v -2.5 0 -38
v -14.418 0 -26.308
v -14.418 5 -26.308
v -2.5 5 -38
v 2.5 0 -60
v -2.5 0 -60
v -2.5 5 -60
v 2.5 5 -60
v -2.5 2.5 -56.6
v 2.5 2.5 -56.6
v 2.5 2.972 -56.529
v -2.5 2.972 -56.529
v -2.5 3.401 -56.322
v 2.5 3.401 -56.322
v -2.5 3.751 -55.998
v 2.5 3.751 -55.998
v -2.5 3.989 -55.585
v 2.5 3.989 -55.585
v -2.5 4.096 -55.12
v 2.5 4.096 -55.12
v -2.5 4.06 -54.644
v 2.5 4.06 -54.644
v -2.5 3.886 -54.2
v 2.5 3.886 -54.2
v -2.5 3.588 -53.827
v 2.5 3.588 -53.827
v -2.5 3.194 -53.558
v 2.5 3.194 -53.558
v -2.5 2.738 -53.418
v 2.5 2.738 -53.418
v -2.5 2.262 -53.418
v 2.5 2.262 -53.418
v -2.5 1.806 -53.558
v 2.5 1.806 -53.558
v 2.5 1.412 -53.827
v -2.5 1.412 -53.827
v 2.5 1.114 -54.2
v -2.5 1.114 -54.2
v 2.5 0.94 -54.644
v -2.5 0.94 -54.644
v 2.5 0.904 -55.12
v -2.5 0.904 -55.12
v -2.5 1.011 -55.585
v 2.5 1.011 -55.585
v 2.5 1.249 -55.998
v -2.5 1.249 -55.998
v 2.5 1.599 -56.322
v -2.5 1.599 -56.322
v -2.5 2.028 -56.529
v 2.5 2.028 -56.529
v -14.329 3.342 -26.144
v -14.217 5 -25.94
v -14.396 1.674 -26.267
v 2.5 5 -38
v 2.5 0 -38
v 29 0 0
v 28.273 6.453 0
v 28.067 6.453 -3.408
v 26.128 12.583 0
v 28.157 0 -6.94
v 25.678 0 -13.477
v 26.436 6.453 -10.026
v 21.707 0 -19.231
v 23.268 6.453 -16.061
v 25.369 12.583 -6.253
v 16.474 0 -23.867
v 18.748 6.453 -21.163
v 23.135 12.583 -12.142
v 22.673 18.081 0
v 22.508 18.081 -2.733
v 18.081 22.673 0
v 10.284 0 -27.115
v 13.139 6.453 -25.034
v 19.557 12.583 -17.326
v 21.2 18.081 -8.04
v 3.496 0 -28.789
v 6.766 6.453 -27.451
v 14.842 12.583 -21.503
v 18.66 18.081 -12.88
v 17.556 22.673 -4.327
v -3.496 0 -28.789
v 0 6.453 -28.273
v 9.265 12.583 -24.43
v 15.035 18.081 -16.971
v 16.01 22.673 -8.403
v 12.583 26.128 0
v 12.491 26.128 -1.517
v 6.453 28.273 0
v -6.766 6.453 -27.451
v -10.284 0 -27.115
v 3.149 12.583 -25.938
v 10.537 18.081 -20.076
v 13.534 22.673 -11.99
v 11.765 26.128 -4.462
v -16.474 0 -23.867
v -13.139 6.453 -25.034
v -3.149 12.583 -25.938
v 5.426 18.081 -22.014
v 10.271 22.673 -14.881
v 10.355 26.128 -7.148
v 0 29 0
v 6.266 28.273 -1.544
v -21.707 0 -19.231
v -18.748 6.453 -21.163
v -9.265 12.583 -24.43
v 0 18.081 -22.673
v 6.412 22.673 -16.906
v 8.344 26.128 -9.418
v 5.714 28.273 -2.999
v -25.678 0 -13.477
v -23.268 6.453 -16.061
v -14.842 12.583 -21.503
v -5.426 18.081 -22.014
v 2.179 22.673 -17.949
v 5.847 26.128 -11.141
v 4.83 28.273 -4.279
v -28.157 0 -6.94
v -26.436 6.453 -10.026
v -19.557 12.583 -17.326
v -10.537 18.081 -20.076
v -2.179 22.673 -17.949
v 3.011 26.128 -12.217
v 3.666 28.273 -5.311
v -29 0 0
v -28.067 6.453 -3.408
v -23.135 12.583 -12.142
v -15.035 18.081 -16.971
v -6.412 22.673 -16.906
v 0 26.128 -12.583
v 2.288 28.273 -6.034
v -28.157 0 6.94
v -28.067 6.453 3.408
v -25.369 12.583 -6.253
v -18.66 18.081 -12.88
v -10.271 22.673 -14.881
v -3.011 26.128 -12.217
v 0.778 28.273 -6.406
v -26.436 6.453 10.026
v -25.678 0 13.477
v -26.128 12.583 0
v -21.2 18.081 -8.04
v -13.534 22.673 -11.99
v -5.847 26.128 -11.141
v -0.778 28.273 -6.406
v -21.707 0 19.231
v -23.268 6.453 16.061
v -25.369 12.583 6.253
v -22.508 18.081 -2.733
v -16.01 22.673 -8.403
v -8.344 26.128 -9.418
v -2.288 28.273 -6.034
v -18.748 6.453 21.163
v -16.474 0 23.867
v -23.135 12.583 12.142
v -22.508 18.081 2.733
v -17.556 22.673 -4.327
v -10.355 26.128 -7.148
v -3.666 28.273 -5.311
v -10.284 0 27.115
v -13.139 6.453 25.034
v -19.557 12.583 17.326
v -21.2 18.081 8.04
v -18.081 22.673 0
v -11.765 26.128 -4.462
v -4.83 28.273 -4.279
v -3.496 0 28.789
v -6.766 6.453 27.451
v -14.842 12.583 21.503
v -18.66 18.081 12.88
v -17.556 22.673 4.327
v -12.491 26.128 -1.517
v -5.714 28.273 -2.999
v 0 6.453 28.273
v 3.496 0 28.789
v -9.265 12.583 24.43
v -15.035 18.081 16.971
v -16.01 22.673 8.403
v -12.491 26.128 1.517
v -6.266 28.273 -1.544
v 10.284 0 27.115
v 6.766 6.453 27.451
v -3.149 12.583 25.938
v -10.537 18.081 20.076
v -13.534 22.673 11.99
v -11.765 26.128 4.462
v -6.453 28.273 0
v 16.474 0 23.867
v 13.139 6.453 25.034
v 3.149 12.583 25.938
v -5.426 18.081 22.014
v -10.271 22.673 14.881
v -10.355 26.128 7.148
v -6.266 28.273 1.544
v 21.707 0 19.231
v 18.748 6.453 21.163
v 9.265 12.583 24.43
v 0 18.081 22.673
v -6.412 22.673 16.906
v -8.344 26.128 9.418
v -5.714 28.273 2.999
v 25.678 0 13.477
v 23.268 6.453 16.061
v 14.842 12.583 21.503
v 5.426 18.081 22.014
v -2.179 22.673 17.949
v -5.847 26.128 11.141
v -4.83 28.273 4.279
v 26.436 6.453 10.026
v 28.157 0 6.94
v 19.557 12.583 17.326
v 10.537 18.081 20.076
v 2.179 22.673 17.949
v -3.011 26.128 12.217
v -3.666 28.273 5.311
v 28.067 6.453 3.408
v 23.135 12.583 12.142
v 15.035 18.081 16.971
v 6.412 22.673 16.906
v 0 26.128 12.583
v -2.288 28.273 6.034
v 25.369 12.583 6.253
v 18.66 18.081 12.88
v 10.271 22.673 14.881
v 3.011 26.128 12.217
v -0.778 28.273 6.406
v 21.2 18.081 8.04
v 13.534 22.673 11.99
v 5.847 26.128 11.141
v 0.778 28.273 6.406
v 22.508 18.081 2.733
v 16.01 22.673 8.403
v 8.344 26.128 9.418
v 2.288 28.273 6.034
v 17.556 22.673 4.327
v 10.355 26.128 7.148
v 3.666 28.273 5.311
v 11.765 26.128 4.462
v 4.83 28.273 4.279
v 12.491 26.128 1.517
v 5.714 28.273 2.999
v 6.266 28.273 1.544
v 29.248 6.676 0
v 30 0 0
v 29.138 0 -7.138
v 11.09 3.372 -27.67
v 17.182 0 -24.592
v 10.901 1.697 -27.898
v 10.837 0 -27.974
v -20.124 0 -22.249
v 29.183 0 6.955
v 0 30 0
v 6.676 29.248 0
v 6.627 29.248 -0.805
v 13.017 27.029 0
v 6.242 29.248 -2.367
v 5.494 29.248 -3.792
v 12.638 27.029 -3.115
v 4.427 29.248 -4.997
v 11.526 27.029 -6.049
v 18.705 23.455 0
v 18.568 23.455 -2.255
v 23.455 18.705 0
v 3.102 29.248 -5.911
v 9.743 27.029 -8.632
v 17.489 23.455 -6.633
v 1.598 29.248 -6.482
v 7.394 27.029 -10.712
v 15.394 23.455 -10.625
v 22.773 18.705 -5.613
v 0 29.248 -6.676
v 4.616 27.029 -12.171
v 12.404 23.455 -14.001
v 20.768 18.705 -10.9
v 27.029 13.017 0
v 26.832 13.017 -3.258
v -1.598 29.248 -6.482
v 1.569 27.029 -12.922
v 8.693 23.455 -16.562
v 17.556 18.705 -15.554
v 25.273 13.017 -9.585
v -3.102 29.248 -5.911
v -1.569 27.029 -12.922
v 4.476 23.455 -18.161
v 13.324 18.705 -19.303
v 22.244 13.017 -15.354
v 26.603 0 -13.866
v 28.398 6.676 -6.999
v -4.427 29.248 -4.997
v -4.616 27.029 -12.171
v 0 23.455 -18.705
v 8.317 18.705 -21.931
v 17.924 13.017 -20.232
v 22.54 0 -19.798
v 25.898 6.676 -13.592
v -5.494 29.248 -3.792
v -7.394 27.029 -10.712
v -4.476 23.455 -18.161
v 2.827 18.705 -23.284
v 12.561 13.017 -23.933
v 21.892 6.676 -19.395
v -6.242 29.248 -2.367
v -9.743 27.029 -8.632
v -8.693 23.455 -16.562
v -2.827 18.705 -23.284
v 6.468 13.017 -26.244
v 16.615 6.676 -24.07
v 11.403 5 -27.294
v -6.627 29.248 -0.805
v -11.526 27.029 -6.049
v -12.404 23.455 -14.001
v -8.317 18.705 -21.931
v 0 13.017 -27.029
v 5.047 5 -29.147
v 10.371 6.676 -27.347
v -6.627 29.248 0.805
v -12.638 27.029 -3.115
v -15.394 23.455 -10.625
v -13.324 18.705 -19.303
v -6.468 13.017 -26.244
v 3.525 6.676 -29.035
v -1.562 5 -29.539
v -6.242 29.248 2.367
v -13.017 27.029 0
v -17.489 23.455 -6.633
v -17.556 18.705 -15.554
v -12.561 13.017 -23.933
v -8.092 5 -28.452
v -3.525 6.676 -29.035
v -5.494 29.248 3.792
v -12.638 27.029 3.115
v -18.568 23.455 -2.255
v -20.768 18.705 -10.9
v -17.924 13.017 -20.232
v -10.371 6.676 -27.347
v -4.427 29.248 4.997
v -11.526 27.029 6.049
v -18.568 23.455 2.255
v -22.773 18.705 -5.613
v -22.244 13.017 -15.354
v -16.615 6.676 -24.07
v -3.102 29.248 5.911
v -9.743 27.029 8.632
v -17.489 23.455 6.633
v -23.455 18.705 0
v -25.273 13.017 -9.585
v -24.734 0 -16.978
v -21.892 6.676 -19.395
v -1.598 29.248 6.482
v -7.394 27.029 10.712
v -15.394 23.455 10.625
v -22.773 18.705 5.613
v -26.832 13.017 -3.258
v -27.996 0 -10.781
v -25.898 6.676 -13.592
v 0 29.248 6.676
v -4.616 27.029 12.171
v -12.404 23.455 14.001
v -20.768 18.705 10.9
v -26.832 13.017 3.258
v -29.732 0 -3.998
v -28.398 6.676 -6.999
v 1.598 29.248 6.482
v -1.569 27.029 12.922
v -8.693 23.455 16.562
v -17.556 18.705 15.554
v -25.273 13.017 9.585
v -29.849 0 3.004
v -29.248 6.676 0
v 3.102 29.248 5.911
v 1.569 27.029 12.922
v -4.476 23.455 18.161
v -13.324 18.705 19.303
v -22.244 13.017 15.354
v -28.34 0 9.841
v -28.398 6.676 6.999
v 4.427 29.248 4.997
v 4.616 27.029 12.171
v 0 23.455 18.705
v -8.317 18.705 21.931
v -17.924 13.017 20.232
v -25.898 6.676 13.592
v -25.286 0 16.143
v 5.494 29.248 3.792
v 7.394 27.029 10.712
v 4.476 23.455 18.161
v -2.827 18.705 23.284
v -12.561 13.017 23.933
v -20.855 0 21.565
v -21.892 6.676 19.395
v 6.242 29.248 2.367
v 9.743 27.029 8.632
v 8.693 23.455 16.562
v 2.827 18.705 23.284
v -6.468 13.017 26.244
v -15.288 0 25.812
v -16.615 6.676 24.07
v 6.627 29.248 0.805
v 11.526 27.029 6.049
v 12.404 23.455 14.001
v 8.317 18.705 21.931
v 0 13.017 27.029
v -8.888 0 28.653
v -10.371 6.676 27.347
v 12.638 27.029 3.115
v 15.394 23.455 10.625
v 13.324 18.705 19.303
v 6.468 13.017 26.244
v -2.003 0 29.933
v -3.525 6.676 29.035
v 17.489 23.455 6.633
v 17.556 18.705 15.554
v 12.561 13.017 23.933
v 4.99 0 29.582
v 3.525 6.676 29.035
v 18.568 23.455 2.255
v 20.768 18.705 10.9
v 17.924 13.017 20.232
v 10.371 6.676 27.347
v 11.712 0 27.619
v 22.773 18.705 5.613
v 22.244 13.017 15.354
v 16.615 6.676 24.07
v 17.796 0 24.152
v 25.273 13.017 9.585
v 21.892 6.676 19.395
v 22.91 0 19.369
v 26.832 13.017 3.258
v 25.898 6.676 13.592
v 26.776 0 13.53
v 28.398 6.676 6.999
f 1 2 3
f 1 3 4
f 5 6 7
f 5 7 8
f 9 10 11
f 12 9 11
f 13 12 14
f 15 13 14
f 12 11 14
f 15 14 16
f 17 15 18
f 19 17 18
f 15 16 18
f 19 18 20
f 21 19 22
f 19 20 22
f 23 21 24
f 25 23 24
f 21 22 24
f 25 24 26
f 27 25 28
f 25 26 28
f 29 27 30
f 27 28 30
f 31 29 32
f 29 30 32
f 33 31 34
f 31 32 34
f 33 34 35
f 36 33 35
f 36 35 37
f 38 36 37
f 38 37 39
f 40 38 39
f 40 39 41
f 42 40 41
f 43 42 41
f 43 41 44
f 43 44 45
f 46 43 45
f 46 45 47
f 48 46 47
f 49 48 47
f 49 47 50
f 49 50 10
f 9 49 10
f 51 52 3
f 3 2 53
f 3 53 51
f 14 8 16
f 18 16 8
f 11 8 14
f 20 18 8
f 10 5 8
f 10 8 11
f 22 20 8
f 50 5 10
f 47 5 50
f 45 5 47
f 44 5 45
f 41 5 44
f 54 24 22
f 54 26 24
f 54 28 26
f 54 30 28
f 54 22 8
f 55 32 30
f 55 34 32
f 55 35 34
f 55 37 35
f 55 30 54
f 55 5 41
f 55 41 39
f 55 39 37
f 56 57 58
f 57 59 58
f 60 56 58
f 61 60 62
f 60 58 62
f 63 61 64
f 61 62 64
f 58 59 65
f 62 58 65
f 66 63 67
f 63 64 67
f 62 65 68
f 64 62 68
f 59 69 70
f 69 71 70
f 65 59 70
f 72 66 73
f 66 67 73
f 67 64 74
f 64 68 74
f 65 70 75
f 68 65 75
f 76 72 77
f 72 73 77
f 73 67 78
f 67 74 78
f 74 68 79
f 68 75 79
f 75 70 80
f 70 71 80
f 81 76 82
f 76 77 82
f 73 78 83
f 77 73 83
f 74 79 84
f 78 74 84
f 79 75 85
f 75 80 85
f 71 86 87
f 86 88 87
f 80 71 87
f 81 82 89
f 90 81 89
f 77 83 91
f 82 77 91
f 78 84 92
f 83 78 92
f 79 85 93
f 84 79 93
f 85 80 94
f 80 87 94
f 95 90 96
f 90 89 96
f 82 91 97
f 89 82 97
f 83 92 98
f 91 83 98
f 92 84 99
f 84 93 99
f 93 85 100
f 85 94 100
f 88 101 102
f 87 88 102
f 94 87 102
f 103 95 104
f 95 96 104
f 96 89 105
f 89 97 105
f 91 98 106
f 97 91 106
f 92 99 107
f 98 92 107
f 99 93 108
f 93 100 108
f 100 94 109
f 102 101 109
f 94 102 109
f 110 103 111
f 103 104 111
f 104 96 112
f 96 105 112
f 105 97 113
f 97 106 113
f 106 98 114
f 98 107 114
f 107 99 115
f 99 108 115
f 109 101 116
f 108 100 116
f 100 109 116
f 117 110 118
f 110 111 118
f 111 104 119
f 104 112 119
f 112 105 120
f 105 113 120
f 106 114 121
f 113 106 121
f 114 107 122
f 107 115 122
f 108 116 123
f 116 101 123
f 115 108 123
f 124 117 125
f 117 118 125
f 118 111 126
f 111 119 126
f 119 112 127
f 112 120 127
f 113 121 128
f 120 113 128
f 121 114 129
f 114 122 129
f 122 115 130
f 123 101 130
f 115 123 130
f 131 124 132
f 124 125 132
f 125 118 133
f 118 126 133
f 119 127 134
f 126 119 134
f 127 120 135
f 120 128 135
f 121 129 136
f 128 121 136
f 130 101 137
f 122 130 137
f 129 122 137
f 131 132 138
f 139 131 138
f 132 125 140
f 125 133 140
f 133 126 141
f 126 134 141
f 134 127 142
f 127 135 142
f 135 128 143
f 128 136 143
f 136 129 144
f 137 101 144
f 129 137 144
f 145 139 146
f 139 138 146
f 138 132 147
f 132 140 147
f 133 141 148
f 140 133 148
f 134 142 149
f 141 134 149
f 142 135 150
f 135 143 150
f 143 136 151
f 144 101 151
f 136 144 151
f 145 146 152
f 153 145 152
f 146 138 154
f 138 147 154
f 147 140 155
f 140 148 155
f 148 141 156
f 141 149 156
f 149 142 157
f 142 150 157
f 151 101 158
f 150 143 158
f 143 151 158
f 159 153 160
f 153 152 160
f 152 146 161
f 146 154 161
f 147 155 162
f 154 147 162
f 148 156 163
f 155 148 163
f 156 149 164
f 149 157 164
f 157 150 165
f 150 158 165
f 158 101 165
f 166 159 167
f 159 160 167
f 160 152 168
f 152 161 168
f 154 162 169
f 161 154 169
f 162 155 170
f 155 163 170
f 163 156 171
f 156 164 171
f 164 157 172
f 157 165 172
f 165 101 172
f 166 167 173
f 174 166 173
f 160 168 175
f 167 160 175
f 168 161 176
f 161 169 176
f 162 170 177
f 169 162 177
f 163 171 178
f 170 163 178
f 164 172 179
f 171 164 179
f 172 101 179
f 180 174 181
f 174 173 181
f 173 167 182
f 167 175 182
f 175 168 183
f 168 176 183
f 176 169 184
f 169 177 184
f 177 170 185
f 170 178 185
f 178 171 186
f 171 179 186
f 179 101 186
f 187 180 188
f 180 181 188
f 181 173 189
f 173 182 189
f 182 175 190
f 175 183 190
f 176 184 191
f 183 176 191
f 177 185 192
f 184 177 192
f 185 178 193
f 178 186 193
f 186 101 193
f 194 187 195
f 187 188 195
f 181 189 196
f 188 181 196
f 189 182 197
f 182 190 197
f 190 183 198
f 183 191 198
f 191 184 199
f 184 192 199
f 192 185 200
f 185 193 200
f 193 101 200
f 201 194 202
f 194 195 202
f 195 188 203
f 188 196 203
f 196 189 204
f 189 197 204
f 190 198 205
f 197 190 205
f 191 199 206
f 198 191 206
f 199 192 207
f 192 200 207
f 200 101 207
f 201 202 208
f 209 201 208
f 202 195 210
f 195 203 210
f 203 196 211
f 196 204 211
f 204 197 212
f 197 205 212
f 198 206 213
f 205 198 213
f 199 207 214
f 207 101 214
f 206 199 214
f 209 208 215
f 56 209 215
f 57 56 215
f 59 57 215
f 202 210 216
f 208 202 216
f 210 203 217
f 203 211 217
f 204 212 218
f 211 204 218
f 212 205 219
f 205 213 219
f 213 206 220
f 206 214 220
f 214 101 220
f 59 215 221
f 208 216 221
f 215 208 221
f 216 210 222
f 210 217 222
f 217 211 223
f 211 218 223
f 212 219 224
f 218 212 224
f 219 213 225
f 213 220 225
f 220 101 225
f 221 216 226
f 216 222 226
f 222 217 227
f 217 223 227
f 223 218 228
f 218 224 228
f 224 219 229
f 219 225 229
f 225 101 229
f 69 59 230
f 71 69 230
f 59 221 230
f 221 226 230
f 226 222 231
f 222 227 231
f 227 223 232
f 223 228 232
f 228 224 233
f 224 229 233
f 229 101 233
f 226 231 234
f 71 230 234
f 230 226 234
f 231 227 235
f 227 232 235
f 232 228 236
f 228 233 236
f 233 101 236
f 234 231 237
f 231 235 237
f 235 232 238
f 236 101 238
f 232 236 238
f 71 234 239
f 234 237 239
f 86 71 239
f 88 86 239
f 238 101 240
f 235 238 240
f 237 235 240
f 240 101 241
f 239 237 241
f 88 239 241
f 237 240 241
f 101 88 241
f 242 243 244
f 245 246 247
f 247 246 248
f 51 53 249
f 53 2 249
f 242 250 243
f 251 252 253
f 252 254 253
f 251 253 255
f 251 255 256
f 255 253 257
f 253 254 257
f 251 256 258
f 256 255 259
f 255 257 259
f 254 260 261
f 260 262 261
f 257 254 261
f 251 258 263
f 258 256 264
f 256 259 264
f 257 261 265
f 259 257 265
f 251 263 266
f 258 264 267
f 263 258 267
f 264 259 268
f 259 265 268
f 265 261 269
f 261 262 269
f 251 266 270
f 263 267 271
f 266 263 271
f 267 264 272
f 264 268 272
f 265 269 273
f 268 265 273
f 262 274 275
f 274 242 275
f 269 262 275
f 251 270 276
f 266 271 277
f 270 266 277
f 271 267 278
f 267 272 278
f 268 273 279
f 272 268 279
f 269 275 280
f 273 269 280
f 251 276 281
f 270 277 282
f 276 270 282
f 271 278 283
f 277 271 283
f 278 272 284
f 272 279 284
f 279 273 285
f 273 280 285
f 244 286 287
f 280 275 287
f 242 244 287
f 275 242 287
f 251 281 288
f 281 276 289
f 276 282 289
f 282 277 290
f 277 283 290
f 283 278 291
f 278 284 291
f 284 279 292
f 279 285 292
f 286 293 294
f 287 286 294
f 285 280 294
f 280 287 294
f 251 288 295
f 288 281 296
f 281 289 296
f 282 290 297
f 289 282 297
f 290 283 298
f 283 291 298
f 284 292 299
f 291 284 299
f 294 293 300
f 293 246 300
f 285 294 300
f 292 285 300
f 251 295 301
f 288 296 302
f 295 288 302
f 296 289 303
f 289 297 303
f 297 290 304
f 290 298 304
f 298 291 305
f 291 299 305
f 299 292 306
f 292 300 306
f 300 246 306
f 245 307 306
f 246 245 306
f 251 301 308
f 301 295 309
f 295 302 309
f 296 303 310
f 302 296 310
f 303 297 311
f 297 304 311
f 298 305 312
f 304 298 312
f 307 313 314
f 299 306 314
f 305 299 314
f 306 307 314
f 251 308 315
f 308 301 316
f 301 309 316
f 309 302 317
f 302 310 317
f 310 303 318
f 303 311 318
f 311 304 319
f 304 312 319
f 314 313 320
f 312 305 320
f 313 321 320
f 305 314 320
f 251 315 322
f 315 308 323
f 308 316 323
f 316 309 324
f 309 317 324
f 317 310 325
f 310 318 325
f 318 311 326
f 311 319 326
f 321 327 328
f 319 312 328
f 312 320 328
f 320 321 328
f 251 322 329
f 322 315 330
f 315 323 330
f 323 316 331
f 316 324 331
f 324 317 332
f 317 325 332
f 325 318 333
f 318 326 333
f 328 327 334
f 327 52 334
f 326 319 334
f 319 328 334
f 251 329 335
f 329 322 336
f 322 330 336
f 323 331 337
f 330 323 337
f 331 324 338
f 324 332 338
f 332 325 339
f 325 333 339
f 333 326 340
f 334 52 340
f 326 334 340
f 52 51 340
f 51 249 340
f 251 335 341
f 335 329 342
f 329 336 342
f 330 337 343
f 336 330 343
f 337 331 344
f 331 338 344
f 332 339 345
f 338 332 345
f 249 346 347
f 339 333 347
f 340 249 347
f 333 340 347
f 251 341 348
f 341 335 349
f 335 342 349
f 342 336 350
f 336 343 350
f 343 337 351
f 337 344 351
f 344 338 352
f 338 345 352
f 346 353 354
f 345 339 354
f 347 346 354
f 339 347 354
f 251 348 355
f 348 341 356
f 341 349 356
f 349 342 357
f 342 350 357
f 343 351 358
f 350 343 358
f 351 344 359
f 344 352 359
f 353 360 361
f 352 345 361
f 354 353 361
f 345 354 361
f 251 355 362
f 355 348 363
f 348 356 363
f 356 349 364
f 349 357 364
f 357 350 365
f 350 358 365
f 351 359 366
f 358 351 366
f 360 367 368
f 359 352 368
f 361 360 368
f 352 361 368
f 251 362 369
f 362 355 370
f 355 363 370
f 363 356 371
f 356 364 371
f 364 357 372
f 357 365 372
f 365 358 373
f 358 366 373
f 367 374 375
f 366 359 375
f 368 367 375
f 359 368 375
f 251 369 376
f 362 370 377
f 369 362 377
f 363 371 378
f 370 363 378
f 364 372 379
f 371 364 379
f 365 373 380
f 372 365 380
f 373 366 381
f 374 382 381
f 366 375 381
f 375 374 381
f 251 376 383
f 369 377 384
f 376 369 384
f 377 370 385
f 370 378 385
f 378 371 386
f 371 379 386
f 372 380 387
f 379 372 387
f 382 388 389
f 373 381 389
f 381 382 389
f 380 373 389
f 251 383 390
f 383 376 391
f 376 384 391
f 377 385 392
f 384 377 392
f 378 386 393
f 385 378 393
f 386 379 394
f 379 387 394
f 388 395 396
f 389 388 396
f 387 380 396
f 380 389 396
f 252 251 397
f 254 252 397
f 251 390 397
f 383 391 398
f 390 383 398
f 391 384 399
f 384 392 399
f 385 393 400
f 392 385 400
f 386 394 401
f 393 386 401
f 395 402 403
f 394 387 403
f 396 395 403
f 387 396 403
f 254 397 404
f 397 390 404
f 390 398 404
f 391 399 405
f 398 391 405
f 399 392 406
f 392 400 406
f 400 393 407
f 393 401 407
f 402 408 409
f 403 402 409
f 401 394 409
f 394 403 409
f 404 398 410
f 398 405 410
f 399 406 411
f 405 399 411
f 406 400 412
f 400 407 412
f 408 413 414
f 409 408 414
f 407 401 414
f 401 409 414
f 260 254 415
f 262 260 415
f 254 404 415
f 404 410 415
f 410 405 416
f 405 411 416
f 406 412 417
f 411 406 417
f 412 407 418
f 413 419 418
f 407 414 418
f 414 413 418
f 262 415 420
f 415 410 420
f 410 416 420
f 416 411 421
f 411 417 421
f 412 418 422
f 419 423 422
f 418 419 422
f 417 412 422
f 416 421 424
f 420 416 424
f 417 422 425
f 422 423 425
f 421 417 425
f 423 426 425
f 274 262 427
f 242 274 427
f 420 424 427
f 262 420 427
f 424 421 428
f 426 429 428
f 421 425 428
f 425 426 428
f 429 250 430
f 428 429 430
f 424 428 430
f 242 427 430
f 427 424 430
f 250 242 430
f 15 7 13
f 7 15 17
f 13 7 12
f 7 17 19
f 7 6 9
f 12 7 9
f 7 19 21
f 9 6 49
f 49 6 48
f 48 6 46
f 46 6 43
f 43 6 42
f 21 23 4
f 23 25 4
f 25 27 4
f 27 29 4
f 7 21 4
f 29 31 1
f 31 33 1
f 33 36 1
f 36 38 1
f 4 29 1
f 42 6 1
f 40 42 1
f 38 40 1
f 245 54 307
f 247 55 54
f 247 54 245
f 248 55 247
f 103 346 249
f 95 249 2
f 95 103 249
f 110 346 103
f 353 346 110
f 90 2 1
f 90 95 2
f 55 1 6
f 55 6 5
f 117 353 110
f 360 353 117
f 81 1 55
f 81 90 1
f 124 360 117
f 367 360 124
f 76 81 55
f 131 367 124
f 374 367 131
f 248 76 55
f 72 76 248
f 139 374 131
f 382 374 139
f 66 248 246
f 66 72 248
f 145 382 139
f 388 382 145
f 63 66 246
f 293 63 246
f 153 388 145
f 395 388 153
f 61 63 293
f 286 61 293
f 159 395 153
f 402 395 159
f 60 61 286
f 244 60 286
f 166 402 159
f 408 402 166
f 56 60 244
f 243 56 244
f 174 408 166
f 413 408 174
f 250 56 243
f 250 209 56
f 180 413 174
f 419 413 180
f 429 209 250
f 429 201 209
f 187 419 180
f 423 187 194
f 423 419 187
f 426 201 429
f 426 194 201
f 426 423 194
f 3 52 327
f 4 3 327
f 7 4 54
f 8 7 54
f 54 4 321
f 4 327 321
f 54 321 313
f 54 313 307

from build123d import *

# Parameters (mm, degrees)
SKETCH3_W           = 5
SKETCH3_H           = 30
BOSS_EXTRUDE1_DEPTH = 5
SKETCH4_R           = 1.6
CUT_EXTRUDE1_DEPTH  = 75.540257579


with BuildPart() as part:
    # Sketch2 → Revolve1 (revolve)
    with BuildSketch(Plane.XY):
        with BuildLine():
            Line((0, 29), (0, 30))
            ThreePointArc((0, 30), (21.213203436, 21.213203436), (30, 0))
            Line((30, 0), (29, 0))
            ThreePointArc((29, 0), (20.506096654, 20.506096654), (0, 29))
        make_face()
    revolve(axis=Axis((0, 0, 0), (0, 1, 0)))

    # Sketch3 → Boss-Extrude1 (add)
    with BuildSketch(Plane.XZ):
        with Locations((0, -45)):
            Rectangle(SKETCH3_W, SKETCH3_H)
        with BuildLine():
            Line((-2.5, -38), (2.5, -38))
            Line((2.5, -38), (12.22277757, -26.308006594))
            Line((12.22277757, -26.308006594), (12.219091313, -26.300072385))
            ThreePointArc((12.219091313, -26.300072385), (-0.967100454, -29.109666297), (-13.937737405, -25.431073041))
            Line((-13.937737405, -25.431073041), (-14.41834904, -26.308006594))
            Line((-14.41834904, -26.308006594), (-2.5, -38))
        make_face()
    extrude(amount=-BOSS_EXTRUDE1_DEPTH)

    # Sketch4 → Cut-Extrude1 (cut, through all)
    with BuildSketch(Plane(origin=(2.5, 0, 0), x_dir=(0, 0, -1), z_dir=(1, 0, 0))):
        with Locations((55, 2.5)):
            Circle(SKETCH4_R)
    extrude(amount=-CUT_EXTRUDE1_DEPTH, mode=Mode.SUBTRACT)


solid = part.part
